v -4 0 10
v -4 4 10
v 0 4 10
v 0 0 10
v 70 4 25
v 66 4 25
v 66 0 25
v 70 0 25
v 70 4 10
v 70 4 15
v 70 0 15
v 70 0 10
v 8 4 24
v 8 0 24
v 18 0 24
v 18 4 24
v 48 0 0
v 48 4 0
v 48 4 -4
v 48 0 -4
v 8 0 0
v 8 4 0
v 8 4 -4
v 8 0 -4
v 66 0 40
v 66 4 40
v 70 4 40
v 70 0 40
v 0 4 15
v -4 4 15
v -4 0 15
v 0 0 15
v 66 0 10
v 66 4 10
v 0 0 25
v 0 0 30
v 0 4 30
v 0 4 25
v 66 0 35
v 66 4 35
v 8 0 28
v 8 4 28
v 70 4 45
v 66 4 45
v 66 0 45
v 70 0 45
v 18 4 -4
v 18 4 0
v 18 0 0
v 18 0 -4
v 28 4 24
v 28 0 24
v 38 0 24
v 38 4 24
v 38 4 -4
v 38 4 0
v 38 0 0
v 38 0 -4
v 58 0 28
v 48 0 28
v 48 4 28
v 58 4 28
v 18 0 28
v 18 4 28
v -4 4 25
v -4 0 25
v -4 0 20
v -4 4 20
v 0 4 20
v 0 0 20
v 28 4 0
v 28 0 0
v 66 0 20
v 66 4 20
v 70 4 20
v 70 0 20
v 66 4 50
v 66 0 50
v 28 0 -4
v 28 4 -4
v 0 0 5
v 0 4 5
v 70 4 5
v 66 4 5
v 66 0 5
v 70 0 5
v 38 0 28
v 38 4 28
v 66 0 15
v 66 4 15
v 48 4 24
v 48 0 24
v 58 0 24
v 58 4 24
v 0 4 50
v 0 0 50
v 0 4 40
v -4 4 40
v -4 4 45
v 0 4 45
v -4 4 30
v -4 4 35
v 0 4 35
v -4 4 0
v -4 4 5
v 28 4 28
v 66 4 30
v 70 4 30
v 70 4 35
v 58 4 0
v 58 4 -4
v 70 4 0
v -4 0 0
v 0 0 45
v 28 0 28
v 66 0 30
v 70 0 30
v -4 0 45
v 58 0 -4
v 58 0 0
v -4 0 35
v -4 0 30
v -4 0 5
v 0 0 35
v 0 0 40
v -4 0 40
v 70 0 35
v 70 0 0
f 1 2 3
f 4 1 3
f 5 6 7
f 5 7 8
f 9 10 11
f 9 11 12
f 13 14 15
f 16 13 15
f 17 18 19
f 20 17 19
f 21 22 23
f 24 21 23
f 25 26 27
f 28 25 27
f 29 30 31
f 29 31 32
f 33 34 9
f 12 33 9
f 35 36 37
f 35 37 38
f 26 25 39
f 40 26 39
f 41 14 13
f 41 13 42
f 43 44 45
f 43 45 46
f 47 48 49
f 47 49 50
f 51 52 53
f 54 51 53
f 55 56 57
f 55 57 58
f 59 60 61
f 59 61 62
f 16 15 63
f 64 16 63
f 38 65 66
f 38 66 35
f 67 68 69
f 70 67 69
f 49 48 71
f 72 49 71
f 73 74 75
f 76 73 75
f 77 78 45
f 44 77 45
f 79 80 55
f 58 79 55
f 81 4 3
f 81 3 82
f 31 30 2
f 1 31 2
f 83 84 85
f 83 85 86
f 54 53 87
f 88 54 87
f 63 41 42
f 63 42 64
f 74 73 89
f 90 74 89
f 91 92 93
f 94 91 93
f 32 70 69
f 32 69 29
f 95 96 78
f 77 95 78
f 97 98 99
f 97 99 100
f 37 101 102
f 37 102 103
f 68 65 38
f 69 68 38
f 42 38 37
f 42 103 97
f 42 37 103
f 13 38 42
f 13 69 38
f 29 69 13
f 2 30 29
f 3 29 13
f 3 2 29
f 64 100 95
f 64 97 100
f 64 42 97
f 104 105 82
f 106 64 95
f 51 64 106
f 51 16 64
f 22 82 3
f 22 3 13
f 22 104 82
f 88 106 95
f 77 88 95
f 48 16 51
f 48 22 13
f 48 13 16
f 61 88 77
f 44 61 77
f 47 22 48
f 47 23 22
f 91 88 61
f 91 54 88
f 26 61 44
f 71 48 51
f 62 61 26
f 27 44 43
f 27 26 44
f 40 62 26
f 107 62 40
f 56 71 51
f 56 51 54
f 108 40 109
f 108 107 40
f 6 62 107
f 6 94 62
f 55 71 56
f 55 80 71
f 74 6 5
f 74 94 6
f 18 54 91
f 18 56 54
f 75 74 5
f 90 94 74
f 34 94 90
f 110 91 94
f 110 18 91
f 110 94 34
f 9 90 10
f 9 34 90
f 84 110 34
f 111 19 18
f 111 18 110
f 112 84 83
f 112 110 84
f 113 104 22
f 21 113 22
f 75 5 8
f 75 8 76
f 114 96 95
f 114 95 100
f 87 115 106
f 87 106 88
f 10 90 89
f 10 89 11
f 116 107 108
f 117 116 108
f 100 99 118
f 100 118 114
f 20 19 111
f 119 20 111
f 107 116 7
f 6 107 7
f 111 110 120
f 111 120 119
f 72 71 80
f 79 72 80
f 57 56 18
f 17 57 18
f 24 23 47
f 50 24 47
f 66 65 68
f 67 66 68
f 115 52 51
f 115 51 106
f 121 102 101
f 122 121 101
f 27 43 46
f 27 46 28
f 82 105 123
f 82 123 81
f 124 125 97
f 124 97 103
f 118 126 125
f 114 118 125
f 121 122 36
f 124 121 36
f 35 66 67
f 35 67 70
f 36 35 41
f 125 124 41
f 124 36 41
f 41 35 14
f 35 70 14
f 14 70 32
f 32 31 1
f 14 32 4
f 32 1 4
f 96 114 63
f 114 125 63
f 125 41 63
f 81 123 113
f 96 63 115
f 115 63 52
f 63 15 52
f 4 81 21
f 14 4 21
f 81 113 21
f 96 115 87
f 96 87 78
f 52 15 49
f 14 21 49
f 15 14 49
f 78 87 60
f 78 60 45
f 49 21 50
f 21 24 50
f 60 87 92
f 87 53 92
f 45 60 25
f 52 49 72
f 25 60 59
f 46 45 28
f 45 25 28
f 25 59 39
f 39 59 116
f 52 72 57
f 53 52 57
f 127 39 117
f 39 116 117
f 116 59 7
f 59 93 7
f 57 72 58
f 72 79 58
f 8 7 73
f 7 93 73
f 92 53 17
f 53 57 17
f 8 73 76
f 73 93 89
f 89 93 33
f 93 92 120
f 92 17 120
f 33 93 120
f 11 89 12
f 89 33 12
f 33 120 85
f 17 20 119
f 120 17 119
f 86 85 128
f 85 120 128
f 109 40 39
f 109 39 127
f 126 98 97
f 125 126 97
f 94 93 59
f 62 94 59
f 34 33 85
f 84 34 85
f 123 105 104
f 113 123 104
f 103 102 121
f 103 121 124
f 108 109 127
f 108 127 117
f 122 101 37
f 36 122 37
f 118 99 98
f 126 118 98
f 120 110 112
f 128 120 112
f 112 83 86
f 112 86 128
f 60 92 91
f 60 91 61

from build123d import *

# Parameters (mm, degrees)
SKETCH1_W           = 66
SKETCH1_H           = 50
BOSS_EXTRUDE1_DEPTH = 4
SKETCH2_W           = 4
SKETCH2_H           = 5
BOSS_EXTRUDE2_DEPTH = 4
LPATTERN1_COUNT     = 5
LPATTERN1_PITCH     = 10
SKETCH3_W           = 10
SKETCH3_H           = 4
BOSS_EXTRUDE3_DEPTH = 4
LPATTERN2_COUNT     = 2
LPATTERN2_PITCH     = 20
LPATTERN2_COL_COUNT = 2
LPATTERN2_COL_PITCH = 20
SKETCH4_W           = 10
SKETCH4_H           = 4
CUT_EXTRUDE1_DEPTH  = 87.116200566


with BuildPart() as part:
    # Sketch1 → Boss-Extrude1 (new body)
    with BuildSketch(Plane(origin=(0, 0, 0), x_dir=(1, 0, 0), z_dir=(0, 1, 0))):
        with Locations((33, -25)):
            Rectangle(SKETCH1_W, SKETCH1_H)
    extrude(amount=BOSS_EXTRUDE1_DEPTH)

    # Sketch2 → Boss-Extrude2 (add, through all)
    with BuildSketch(Plane(origin=(0, 4, 0), x_dir=(1, 0, 0), z_dir=(0, 1, 0))):
        with Locations((-2, -2.5)):
            Rectangle(SKETCH2_W, SKETCH2_H)
        with Locations((68, -2.5)):
            Rectangle(SKETCH2_W, SKETCH2_H)
    boss_extrude2 = extrude(amount=-BOSS_EXTRUDE2_DEPTH)

    # LPattern1: Boss-Extrude2 ×5
    with Locations(*[(0, 0, i * LPATTERN1_PITCH) for i in range(1, LPATTERN1_COUNT)]):
        add(boss_extrude2)

    # Sketch3 → Boss-Extrude3 (add, through all)
    with BuildSketch(Plane(origin=(0, 4, 0), x_dir=(1, 0, 0), z_dir=(0, 1, 0))):
        with Locations((33, 2)):
            Rectangle(SKETCH3_W, SKETCH3_H)
    boss_extrude3 = extrude(amount=-BOSS_EXTRUDE3_DEPTH)

    # LPattern2: Boss-Extrude3 ×2
    with Locations(*[(i * LPATTERN2_PITCH, 0, 0) for i in range(1, LPATTERN2_COUNT)]):
        add(boss_extrude3)

    # LPattern2 col: Boss-Extrude3 ×2
    with Locations(*[(-i * LPATTERN2_COL_PITCH, 0, 0) for i in range(1, LPATTERN2_COL_COUNT)]):
        add(boss_extrude3)

    # Sketch4 → Cut-Extrude1 (cut, through all)
    with BuildSketch(Plane.XZ):
        with Locations((13, 26)):
            Rectangle(SKETCH4_W, SKETCH4_H)
        with Locations((33, 26)):
            Rectangle(SKETCH4_W, SKETCH4_H)
        with Locations((53, 26)):
            Rectangle(SKETCH4_W, SKETCH4_H)
    extrude(amount=-CUT_EXTRUDE1_DEPTH, mode=Mode.SUBTRACT)


solid = part.part
